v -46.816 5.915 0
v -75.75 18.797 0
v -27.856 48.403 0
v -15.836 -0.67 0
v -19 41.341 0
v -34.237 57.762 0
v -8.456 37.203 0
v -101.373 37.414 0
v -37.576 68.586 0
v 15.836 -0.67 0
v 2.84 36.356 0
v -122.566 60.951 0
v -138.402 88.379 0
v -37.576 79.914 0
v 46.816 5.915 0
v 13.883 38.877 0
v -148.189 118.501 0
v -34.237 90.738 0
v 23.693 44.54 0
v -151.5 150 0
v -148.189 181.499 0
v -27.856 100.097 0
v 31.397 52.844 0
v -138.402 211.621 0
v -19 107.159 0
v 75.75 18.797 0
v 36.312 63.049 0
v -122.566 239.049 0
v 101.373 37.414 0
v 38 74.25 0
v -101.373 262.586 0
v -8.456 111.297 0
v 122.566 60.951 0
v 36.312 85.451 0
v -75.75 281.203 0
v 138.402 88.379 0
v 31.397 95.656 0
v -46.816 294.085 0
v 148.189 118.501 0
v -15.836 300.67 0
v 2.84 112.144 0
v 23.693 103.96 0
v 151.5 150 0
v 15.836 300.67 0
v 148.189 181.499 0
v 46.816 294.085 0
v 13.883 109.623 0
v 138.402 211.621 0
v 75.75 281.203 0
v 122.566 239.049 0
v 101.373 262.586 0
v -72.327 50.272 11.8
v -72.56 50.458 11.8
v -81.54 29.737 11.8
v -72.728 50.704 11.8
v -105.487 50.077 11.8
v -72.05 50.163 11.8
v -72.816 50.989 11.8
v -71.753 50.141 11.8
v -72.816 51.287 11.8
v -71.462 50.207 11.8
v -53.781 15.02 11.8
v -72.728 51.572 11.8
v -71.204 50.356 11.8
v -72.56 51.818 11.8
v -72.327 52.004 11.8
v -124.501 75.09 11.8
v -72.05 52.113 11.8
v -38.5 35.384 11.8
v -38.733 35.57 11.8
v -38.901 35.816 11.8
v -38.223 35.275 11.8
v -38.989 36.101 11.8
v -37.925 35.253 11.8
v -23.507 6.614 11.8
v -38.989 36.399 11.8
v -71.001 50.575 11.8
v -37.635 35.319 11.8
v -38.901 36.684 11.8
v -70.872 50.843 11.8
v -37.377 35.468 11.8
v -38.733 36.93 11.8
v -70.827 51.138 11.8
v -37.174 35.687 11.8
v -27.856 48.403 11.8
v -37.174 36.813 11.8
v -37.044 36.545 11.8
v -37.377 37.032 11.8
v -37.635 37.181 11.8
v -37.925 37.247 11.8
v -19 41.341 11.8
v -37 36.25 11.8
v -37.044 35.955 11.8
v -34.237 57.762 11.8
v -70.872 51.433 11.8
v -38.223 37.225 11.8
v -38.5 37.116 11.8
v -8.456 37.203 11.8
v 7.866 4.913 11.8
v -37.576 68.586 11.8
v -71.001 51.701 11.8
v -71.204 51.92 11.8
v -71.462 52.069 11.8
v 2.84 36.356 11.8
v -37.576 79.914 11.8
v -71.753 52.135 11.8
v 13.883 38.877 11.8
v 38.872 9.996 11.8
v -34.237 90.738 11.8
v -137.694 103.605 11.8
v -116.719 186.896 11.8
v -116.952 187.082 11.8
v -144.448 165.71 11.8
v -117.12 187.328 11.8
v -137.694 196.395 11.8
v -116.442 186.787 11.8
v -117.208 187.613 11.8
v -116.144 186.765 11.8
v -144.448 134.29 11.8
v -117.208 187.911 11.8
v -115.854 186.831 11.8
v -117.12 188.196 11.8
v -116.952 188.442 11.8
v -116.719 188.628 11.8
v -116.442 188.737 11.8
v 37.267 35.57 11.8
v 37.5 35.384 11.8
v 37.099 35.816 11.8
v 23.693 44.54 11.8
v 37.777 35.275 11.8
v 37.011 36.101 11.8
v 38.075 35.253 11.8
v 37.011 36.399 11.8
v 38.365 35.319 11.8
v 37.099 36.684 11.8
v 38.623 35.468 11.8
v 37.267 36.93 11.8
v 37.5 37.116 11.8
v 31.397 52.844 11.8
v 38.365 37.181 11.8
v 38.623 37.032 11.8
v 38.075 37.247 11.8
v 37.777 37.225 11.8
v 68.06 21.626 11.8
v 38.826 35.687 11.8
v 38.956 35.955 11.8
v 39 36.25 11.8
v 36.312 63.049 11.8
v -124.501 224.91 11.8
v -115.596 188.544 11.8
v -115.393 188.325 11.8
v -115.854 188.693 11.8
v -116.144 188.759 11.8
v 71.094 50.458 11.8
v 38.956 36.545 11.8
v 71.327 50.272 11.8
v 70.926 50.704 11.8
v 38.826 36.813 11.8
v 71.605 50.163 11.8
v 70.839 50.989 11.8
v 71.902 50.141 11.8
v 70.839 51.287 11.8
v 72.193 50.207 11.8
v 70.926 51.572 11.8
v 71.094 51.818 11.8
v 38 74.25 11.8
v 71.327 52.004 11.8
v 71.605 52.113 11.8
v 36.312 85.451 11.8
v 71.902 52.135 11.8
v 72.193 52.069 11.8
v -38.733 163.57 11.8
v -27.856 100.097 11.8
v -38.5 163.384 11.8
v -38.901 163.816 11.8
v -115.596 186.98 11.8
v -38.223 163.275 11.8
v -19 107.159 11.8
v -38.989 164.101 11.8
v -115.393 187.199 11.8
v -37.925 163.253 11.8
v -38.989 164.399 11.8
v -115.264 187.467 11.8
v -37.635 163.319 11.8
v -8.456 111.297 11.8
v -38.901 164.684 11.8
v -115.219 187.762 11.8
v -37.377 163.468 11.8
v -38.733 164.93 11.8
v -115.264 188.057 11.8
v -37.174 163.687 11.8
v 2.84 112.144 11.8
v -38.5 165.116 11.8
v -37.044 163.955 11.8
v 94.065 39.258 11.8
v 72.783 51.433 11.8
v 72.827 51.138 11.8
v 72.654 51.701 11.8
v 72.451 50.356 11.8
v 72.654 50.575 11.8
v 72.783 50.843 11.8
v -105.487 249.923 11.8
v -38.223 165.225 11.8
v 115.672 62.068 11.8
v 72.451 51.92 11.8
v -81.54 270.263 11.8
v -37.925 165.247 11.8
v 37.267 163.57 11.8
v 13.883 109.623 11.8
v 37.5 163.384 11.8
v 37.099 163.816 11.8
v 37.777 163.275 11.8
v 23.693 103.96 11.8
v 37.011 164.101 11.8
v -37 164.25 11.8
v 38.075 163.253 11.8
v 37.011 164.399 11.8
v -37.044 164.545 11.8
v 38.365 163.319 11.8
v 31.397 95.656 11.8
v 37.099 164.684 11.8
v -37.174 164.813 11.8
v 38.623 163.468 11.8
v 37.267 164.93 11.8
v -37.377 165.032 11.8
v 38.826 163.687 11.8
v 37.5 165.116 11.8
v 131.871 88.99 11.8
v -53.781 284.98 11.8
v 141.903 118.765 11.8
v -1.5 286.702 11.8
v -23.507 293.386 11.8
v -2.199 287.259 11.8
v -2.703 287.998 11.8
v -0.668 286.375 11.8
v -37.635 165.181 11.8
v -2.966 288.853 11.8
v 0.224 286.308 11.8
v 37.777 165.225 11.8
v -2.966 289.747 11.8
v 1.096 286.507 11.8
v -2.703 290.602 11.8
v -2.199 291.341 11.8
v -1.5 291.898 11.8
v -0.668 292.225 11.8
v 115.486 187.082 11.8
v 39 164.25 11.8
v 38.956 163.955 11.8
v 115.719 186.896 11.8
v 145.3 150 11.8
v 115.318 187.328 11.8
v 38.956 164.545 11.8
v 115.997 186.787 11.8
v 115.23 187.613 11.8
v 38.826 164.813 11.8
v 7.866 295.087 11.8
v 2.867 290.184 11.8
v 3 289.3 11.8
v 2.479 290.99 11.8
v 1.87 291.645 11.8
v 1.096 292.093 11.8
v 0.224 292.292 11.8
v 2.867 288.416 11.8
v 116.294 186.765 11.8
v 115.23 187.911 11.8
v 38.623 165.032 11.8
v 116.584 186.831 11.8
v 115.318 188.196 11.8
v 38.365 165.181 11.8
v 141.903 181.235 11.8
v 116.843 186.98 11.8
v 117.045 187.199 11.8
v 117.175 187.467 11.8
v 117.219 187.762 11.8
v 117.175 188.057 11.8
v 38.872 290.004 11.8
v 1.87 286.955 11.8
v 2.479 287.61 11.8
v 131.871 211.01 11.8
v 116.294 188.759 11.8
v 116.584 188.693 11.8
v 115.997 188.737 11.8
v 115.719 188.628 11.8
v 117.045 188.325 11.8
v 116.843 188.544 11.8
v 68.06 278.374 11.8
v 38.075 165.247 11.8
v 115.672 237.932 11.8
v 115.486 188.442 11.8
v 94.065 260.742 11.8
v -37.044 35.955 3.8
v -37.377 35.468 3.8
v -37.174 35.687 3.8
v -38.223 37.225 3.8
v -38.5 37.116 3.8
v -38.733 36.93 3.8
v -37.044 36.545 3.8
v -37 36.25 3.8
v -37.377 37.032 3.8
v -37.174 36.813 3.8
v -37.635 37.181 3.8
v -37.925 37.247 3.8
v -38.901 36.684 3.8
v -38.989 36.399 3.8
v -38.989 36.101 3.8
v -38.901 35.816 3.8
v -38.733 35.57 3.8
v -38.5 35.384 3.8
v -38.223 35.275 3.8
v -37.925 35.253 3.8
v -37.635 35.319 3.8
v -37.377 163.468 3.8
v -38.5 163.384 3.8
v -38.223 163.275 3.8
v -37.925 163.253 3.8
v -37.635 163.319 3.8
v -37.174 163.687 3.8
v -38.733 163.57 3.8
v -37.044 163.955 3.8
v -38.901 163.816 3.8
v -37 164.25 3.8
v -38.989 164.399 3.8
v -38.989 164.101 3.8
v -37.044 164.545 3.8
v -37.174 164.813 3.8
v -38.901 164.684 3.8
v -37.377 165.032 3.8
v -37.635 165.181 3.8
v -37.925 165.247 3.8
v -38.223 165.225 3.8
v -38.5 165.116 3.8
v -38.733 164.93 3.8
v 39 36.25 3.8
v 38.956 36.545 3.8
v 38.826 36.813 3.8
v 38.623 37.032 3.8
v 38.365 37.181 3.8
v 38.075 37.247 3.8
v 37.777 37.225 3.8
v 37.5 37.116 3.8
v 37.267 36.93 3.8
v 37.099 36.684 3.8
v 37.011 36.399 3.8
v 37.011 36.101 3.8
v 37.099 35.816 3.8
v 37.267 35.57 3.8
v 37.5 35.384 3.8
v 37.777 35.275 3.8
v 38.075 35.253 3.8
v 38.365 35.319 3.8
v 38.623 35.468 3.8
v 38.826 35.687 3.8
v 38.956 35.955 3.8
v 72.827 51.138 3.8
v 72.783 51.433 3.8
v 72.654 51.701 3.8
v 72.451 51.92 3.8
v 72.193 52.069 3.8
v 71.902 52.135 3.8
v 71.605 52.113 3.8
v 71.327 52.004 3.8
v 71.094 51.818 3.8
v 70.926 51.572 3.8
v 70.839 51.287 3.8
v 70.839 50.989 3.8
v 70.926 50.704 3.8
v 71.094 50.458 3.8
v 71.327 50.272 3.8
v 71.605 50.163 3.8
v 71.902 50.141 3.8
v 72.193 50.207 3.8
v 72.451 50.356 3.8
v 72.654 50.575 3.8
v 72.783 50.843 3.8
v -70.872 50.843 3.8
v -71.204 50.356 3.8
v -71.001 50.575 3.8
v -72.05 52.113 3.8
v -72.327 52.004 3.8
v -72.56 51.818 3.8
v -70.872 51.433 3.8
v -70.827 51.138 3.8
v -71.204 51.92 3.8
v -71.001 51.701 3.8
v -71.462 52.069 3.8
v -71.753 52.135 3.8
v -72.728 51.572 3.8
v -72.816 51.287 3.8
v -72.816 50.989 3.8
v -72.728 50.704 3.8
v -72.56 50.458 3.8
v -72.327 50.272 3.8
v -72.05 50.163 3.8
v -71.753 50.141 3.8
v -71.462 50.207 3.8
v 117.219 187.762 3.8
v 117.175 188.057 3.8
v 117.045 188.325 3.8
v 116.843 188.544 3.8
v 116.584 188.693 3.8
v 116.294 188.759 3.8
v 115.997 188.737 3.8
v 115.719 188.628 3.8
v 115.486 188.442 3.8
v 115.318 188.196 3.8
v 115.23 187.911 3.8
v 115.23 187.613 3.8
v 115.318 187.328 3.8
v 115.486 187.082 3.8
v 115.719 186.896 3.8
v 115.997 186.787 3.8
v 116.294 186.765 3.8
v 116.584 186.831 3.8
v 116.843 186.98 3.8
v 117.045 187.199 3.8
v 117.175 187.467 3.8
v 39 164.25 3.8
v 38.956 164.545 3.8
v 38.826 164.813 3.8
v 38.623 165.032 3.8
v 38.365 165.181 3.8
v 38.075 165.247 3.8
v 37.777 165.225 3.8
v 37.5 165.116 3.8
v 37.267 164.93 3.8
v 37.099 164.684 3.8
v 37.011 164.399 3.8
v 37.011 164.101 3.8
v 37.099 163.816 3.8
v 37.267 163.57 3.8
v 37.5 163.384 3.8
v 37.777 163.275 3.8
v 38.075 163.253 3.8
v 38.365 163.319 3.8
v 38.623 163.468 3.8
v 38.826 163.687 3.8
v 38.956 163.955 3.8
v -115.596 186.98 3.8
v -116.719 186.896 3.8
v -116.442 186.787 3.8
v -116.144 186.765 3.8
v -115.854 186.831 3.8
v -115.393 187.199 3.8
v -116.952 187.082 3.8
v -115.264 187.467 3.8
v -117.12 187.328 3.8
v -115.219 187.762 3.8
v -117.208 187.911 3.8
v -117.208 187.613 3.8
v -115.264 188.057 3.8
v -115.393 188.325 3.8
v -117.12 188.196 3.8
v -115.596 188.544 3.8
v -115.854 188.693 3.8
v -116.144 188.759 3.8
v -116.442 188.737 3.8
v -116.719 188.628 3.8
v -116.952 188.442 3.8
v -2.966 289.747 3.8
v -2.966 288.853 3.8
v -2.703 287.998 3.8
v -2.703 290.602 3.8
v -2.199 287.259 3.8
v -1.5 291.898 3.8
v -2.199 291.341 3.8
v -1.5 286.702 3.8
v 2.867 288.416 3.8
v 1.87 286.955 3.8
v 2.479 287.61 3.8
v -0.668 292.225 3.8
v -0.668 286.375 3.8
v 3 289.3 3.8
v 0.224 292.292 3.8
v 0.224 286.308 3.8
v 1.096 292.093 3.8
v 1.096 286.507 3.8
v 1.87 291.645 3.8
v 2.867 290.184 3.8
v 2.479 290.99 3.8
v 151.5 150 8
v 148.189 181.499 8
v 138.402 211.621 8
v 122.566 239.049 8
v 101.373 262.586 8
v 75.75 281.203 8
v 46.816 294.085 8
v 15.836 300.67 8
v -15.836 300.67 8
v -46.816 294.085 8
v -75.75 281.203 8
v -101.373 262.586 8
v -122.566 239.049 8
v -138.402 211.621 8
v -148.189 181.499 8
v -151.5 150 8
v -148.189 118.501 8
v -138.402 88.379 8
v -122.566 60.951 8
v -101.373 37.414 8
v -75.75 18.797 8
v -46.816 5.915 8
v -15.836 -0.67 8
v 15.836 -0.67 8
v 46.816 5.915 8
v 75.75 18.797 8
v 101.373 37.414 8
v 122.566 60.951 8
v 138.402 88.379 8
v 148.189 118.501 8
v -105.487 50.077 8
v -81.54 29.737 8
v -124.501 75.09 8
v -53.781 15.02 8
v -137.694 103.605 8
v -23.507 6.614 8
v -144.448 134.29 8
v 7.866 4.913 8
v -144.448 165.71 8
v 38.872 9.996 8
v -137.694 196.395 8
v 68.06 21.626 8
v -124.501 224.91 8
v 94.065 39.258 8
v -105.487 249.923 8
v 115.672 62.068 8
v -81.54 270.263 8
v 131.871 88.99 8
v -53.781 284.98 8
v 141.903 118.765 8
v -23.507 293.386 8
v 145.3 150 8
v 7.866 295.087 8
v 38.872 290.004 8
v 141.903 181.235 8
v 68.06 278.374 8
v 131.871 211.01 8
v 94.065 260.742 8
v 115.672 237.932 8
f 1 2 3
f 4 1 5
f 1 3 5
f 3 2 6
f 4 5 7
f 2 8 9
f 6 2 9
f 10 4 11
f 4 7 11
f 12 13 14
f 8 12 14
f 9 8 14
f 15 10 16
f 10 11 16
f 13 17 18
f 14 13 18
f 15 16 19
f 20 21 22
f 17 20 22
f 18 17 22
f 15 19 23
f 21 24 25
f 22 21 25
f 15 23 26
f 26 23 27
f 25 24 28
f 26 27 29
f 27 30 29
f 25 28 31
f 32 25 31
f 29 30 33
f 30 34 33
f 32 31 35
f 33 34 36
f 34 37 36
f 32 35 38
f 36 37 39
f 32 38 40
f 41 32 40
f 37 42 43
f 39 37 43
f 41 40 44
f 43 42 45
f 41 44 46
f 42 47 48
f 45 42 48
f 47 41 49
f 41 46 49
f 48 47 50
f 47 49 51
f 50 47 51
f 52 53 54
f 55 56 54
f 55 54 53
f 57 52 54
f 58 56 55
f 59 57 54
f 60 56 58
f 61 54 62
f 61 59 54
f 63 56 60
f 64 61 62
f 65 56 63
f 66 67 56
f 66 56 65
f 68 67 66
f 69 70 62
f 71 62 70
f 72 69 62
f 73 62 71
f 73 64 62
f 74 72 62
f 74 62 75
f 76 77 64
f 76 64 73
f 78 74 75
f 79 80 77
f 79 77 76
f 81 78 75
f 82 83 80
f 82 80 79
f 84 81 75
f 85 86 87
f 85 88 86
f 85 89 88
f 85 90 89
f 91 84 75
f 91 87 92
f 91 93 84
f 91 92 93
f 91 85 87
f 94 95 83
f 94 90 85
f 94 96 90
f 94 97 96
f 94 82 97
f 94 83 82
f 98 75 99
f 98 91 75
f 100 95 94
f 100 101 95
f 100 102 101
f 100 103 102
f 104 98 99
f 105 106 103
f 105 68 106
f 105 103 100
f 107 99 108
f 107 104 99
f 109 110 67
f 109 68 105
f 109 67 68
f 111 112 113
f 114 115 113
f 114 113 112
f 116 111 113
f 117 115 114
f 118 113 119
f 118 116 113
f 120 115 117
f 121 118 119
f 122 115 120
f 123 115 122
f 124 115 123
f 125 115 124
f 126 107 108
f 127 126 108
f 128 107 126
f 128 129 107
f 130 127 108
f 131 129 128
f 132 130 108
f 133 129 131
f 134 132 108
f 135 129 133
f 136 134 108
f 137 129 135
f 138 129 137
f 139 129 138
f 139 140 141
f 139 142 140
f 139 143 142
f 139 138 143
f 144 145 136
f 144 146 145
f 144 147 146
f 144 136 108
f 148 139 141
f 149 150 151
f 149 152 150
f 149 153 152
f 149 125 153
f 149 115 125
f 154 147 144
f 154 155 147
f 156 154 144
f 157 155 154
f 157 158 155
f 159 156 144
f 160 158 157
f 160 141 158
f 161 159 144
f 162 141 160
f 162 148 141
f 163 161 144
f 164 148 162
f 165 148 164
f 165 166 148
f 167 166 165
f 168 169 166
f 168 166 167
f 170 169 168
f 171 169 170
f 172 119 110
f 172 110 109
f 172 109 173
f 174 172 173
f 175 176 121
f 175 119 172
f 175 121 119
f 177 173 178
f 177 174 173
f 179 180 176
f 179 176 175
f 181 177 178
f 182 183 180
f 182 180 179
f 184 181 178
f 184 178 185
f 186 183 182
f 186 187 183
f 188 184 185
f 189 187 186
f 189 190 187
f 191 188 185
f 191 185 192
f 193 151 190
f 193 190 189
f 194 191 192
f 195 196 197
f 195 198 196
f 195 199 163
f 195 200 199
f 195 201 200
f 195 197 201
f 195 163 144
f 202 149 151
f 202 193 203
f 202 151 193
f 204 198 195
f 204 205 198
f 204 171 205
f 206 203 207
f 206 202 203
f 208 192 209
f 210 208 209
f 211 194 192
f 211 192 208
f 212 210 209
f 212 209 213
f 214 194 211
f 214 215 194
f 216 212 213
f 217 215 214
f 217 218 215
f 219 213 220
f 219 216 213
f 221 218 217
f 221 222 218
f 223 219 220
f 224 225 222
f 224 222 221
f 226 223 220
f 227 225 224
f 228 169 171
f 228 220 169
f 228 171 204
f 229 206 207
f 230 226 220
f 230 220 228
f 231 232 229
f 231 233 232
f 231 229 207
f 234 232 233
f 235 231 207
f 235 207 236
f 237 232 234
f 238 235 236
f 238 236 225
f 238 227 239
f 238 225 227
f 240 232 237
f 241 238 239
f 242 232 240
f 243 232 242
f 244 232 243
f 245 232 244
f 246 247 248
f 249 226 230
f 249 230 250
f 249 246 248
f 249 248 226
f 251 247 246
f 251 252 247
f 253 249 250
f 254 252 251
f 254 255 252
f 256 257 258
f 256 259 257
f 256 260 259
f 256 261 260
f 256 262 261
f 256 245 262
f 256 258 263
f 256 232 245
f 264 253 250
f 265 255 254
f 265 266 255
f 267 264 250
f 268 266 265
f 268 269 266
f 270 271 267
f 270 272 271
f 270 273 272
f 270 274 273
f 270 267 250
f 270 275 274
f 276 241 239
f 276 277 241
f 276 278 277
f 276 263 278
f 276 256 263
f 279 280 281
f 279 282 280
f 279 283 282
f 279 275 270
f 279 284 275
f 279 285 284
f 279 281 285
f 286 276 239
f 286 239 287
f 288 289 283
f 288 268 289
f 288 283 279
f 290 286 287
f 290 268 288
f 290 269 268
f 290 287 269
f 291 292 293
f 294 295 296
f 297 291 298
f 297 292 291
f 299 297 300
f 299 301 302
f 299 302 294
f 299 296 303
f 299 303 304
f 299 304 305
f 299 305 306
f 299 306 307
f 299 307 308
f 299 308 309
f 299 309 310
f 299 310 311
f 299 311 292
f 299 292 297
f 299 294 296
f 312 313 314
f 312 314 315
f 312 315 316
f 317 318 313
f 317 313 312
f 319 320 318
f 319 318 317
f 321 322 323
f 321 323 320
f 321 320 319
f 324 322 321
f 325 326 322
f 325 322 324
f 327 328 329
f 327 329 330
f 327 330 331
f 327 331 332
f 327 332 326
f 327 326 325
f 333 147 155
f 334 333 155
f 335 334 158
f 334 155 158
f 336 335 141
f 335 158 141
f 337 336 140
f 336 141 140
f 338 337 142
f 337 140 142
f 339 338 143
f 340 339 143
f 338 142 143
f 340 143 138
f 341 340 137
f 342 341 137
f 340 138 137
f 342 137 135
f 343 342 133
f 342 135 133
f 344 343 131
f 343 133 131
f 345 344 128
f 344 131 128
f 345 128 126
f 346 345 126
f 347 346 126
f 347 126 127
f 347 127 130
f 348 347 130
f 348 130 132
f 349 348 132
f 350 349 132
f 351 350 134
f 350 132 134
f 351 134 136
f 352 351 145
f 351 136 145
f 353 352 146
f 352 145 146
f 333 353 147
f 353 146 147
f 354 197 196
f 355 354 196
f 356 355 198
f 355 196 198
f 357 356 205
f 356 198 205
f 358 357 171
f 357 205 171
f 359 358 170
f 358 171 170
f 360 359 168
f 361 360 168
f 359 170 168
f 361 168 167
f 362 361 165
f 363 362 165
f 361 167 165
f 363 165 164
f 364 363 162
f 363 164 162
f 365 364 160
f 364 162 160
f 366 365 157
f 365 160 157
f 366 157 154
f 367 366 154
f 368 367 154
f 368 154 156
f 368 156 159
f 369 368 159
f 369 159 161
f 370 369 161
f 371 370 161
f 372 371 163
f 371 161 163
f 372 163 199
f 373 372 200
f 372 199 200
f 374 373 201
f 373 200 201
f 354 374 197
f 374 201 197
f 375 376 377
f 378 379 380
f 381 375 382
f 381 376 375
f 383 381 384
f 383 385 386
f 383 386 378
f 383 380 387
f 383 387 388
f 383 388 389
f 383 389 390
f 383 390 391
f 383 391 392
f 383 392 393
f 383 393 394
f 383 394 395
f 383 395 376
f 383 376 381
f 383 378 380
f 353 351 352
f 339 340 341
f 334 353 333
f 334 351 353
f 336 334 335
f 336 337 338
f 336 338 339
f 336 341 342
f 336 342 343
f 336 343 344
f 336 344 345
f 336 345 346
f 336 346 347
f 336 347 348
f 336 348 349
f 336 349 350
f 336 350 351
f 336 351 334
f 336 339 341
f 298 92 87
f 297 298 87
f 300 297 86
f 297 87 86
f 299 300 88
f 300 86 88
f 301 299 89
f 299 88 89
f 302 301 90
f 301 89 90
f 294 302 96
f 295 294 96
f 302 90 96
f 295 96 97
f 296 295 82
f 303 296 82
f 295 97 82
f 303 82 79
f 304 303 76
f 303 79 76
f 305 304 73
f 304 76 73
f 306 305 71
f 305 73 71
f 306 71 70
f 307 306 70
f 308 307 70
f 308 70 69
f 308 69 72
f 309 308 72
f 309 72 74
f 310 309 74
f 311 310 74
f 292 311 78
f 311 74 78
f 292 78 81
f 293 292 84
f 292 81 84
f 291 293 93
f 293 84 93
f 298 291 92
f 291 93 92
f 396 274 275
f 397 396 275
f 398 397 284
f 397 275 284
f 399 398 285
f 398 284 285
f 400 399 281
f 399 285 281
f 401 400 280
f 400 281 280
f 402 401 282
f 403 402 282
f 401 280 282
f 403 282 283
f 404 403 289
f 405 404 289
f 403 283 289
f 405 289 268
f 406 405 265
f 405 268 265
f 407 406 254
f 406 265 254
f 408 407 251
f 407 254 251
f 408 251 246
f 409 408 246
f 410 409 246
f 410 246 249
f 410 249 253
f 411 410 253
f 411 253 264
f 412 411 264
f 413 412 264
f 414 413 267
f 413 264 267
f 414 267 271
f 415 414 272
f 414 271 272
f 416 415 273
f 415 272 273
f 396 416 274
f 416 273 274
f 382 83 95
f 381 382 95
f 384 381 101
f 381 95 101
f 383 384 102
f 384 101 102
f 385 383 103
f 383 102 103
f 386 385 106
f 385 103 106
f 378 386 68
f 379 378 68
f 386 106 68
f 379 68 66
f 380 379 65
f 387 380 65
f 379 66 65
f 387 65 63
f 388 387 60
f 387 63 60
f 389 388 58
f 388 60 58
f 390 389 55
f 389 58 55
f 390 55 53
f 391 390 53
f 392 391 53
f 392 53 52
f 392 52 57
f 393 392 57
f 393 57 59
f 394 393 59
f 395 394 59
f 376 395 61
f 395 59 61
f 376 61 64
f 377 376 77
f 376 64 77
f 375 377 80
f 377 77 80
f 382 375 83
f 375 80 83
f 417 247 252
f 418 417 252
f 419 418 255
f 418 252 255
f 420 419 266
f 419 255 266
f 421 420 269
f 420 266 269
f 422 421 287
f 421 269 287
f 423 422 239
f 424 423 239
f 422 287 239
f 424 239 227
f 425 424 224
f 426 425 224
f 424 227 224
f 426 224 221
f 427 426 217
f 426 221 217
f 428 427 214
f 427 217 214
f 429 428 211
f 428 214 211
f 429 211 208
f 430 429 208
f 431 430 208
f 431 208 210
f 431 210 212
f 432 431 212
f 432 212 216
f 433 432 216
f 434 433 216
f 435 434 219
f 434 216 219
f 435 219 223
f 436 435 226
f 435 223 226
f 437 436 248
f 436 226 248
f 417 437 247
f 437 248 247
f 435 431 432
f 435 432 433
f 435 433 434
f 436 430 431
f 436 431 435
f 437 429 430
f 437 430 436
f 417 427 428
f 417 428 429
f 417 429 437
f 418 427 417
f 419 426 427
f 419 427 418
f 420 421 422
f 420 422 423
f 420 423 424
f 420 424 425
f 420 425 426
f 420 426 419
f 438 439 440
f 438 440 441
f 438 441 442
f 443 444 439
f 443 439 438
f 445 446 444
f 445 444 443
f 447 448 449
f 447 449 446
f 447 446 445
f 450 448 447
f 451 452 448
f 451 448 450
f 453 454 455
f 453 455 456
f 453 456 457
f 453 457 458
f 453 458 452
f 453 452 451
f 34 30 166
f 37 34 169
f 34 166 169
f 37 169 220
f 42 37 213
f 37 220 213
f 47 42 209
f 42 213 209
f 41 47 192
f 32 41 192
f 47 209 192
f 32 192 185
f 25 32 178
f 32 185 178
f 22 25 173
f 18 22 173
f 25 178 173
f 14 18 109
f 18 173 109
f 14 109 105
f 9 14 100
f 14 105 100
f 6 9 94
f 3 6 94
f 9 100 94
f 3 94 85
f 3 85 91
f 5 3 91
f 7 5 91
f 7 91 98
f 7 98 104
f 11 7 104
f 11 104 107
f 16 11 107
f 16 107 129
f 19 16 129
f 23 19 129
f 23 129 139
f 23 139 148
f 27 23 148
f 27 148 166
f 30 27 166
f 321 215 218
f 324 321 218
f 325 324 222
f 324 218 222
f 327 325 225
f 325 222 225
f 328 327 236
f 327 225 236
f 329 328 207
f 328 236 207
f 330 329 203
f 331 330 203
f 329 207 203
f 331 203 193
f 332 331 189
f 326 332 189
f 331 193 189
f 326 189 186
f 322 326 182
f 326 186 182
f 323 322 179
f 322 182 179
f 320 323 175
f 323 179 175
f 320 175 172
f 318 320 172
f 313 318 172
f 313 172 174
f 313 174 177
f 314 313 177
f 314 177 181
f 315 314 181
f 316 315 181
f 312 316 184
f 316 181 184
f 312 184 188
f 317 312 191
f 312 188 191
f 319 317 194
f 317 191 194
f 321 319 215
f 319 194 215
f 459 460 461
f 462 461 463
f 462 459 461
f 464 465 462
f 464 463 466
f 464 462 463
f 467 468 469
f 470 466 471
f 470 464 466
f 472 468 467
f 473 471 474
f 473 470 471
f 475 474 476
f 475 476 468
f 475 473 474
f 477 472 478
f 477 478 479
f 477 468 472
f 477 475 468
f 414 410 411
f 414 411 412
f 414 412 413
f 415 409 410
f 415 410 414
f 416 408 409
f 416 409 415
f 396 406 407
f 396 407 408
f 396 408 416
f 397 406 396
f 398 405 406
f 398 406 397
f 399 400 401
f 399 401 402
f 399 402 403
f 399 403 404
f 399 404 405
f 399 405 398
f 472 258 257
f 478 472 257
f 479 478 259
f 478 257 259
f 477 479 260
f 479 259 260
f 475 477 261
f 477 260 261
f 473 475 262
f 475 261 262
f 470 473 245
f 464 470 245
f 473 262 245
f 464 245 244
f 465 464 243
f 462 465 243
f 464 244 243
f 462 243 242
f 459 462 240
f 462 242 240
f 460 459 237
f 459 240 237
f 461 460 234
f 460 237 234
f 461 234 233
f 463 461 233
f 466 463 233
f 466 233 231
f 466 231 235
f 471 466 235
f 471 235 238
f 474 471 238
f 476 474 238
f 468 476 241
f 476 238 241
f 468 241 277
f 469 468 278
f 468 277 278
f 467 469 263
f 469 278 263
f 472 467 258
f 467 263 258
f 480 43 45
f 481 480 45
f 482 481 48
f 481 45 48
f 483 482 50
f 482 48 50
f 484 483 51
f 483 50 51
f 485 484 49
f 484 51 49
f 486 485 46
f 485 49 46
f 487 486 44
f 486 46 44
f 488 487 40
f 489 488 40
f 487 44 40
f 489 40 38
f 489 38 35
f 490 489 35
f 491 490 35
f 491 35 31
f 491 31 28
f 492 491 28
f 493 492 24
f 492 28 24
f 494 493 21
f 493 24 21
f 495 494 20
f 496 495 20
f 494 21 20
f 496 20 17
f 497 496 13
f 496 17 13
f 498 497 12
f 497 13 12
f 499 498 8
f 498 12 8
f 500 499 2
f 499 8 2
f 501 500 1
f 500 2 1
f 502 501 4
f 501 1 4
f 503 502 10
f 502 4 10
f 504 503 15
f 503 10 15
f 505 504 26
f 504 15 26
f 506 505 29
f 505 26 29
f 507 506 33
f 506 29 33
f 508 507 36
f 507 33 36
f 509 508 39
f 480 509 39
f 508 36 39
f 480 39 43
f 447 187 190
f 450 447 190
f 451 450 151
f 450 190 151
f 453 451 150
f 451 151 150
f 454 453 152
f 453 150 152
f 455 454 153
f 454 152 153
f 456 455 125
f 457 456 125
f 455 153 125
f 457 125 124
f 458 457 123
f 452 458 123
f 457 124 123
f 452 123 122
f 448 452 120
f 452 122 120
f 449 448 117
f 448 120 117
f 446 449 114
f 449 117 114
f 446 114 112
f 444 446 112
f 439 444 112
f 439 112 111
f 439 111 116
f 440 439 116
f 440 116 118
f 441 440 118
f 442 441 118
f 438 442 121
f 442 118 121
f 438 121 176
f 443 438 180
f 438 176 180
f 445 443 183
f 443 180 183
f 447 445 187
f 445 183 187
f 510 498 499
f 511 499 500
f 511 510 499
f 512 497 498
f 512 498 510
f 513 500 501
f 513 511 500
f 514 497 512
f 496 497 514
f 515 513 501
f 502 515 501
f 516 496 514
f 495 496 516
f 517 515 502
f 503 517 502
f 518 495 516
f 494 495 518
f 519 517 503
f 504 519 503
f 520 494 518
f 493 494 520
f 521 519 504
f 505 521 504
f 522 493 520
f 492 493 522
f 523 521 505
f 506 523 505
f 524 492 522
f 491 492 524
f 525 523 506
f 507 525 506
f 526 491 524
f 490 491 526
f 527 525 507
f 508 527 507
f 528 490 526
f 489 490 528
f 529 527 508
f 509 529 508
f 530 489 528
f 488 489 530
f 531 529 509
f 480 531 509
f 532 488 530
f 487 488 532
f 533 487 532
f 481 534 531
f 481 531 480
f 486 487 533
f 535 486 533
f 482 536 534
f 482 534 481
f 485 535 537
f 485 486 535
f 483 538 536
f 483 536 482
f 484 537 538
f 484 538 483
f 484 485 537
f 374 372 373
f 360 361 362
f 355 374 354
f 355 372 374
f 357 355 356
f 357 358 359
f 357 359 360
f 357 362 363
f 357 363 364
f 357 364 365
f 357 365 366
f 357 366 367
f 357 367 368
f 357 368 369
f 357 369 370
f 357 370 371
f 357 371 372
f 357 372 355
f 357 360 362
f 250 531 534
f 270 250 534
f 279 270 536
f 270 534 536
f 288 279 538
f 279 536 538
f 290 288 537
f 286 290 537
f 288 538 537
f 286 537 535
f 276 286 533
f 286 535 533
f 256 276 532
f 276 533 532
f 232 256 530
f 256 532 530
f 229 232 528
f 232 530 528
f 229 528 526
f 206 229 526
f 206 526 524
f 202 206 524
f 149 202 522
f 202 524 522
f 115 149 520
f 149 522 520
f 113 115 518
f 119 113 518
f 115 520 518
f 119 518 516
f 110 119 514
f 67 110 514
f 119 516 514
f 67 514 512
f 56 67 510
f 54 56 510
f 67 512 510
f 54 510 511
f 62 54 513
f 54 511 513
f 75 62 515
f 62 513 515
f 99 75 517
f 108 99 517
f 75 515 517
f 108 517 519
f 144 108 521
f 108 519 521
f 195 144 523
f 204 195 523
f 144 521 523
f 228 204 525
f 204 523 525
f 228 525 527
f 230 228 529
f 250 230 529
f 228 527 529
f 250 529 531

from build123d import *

# Parameters (mm, degrees)
SKETCH049_R     = 151.5
PAD_DEPTH       = 8
SKETCH050_R     = 145.3
PAD008_DEPTH    = 3.8
SKETCH051_R     = 1
SKETCH051_R_2   = 3
POCKET_DEPTH    = 8
SKETCH052_R     = 38
POCKET005_DEPTH = 11.801


with BuildPart() as part:
    # Sketch049 → Pad (new body)
    with BuildSketch(Plane.XY):
        Circle(SKETCH049_R)
    extrude(amount=PAD_DEPTH)

    # Sketch050 (on Face3 of Pad) → Pad008 (join)
    with BuildSketch(Plane.XY.offset(8)):
        Circle(SKETCH050_R)
    extrude(amount=PAD008_DEPTH)

    # Sketch051 (on Face5 of Pad008) → Pocket (cut)
    with BuildSketch(Plane.XY.offset(11.8)):
        with Locations((-38, -113.75)):
            Circle(SKETCH051_R)
        with Locations((-71.827358, -98.861877)):
            Circle(SKETCH051_R)
        with Locations((38, -113.75)):
            Circle(SKETCH051_R)
        with Locations((71.827358, -98.861877)):
            Circle(SKETCH051_R)
        with Locations((38, 14.25)):
            Circle(SKETCH051_R)
        with Locations((-38, 14.25)):
            Circle(SKETCH051_R)
        with Locations((-116.219106, 37.761877)):
            Circle(SKETCH051_R)
        with Locations((116.219106, 37.761877)):
            Circle(SKETCH051_R)
        with Locations((0, 139.3)):
            Circle(SKETCH051_R_2)
    extrude(amount=-POCKET_DEPTH, mode=Mode.SUBTRACT)

    # Sketch052 (on Face5 of Pad008) → Pocket005 (cut, through all)
    with BuildSketch(Plane.XY.offset(11.8)):
        with Locations((0, -75.75)):
            Circle(SKETCH052_R)
    extrude(amount=-POCKET005_DEPTH, mode=Mode.SUBTRACT)


with BuildPart() as part_1:
    # Body placement: moved
    add(part.part.moved(Location((0, 150, 0))))


solid = part_1.part
